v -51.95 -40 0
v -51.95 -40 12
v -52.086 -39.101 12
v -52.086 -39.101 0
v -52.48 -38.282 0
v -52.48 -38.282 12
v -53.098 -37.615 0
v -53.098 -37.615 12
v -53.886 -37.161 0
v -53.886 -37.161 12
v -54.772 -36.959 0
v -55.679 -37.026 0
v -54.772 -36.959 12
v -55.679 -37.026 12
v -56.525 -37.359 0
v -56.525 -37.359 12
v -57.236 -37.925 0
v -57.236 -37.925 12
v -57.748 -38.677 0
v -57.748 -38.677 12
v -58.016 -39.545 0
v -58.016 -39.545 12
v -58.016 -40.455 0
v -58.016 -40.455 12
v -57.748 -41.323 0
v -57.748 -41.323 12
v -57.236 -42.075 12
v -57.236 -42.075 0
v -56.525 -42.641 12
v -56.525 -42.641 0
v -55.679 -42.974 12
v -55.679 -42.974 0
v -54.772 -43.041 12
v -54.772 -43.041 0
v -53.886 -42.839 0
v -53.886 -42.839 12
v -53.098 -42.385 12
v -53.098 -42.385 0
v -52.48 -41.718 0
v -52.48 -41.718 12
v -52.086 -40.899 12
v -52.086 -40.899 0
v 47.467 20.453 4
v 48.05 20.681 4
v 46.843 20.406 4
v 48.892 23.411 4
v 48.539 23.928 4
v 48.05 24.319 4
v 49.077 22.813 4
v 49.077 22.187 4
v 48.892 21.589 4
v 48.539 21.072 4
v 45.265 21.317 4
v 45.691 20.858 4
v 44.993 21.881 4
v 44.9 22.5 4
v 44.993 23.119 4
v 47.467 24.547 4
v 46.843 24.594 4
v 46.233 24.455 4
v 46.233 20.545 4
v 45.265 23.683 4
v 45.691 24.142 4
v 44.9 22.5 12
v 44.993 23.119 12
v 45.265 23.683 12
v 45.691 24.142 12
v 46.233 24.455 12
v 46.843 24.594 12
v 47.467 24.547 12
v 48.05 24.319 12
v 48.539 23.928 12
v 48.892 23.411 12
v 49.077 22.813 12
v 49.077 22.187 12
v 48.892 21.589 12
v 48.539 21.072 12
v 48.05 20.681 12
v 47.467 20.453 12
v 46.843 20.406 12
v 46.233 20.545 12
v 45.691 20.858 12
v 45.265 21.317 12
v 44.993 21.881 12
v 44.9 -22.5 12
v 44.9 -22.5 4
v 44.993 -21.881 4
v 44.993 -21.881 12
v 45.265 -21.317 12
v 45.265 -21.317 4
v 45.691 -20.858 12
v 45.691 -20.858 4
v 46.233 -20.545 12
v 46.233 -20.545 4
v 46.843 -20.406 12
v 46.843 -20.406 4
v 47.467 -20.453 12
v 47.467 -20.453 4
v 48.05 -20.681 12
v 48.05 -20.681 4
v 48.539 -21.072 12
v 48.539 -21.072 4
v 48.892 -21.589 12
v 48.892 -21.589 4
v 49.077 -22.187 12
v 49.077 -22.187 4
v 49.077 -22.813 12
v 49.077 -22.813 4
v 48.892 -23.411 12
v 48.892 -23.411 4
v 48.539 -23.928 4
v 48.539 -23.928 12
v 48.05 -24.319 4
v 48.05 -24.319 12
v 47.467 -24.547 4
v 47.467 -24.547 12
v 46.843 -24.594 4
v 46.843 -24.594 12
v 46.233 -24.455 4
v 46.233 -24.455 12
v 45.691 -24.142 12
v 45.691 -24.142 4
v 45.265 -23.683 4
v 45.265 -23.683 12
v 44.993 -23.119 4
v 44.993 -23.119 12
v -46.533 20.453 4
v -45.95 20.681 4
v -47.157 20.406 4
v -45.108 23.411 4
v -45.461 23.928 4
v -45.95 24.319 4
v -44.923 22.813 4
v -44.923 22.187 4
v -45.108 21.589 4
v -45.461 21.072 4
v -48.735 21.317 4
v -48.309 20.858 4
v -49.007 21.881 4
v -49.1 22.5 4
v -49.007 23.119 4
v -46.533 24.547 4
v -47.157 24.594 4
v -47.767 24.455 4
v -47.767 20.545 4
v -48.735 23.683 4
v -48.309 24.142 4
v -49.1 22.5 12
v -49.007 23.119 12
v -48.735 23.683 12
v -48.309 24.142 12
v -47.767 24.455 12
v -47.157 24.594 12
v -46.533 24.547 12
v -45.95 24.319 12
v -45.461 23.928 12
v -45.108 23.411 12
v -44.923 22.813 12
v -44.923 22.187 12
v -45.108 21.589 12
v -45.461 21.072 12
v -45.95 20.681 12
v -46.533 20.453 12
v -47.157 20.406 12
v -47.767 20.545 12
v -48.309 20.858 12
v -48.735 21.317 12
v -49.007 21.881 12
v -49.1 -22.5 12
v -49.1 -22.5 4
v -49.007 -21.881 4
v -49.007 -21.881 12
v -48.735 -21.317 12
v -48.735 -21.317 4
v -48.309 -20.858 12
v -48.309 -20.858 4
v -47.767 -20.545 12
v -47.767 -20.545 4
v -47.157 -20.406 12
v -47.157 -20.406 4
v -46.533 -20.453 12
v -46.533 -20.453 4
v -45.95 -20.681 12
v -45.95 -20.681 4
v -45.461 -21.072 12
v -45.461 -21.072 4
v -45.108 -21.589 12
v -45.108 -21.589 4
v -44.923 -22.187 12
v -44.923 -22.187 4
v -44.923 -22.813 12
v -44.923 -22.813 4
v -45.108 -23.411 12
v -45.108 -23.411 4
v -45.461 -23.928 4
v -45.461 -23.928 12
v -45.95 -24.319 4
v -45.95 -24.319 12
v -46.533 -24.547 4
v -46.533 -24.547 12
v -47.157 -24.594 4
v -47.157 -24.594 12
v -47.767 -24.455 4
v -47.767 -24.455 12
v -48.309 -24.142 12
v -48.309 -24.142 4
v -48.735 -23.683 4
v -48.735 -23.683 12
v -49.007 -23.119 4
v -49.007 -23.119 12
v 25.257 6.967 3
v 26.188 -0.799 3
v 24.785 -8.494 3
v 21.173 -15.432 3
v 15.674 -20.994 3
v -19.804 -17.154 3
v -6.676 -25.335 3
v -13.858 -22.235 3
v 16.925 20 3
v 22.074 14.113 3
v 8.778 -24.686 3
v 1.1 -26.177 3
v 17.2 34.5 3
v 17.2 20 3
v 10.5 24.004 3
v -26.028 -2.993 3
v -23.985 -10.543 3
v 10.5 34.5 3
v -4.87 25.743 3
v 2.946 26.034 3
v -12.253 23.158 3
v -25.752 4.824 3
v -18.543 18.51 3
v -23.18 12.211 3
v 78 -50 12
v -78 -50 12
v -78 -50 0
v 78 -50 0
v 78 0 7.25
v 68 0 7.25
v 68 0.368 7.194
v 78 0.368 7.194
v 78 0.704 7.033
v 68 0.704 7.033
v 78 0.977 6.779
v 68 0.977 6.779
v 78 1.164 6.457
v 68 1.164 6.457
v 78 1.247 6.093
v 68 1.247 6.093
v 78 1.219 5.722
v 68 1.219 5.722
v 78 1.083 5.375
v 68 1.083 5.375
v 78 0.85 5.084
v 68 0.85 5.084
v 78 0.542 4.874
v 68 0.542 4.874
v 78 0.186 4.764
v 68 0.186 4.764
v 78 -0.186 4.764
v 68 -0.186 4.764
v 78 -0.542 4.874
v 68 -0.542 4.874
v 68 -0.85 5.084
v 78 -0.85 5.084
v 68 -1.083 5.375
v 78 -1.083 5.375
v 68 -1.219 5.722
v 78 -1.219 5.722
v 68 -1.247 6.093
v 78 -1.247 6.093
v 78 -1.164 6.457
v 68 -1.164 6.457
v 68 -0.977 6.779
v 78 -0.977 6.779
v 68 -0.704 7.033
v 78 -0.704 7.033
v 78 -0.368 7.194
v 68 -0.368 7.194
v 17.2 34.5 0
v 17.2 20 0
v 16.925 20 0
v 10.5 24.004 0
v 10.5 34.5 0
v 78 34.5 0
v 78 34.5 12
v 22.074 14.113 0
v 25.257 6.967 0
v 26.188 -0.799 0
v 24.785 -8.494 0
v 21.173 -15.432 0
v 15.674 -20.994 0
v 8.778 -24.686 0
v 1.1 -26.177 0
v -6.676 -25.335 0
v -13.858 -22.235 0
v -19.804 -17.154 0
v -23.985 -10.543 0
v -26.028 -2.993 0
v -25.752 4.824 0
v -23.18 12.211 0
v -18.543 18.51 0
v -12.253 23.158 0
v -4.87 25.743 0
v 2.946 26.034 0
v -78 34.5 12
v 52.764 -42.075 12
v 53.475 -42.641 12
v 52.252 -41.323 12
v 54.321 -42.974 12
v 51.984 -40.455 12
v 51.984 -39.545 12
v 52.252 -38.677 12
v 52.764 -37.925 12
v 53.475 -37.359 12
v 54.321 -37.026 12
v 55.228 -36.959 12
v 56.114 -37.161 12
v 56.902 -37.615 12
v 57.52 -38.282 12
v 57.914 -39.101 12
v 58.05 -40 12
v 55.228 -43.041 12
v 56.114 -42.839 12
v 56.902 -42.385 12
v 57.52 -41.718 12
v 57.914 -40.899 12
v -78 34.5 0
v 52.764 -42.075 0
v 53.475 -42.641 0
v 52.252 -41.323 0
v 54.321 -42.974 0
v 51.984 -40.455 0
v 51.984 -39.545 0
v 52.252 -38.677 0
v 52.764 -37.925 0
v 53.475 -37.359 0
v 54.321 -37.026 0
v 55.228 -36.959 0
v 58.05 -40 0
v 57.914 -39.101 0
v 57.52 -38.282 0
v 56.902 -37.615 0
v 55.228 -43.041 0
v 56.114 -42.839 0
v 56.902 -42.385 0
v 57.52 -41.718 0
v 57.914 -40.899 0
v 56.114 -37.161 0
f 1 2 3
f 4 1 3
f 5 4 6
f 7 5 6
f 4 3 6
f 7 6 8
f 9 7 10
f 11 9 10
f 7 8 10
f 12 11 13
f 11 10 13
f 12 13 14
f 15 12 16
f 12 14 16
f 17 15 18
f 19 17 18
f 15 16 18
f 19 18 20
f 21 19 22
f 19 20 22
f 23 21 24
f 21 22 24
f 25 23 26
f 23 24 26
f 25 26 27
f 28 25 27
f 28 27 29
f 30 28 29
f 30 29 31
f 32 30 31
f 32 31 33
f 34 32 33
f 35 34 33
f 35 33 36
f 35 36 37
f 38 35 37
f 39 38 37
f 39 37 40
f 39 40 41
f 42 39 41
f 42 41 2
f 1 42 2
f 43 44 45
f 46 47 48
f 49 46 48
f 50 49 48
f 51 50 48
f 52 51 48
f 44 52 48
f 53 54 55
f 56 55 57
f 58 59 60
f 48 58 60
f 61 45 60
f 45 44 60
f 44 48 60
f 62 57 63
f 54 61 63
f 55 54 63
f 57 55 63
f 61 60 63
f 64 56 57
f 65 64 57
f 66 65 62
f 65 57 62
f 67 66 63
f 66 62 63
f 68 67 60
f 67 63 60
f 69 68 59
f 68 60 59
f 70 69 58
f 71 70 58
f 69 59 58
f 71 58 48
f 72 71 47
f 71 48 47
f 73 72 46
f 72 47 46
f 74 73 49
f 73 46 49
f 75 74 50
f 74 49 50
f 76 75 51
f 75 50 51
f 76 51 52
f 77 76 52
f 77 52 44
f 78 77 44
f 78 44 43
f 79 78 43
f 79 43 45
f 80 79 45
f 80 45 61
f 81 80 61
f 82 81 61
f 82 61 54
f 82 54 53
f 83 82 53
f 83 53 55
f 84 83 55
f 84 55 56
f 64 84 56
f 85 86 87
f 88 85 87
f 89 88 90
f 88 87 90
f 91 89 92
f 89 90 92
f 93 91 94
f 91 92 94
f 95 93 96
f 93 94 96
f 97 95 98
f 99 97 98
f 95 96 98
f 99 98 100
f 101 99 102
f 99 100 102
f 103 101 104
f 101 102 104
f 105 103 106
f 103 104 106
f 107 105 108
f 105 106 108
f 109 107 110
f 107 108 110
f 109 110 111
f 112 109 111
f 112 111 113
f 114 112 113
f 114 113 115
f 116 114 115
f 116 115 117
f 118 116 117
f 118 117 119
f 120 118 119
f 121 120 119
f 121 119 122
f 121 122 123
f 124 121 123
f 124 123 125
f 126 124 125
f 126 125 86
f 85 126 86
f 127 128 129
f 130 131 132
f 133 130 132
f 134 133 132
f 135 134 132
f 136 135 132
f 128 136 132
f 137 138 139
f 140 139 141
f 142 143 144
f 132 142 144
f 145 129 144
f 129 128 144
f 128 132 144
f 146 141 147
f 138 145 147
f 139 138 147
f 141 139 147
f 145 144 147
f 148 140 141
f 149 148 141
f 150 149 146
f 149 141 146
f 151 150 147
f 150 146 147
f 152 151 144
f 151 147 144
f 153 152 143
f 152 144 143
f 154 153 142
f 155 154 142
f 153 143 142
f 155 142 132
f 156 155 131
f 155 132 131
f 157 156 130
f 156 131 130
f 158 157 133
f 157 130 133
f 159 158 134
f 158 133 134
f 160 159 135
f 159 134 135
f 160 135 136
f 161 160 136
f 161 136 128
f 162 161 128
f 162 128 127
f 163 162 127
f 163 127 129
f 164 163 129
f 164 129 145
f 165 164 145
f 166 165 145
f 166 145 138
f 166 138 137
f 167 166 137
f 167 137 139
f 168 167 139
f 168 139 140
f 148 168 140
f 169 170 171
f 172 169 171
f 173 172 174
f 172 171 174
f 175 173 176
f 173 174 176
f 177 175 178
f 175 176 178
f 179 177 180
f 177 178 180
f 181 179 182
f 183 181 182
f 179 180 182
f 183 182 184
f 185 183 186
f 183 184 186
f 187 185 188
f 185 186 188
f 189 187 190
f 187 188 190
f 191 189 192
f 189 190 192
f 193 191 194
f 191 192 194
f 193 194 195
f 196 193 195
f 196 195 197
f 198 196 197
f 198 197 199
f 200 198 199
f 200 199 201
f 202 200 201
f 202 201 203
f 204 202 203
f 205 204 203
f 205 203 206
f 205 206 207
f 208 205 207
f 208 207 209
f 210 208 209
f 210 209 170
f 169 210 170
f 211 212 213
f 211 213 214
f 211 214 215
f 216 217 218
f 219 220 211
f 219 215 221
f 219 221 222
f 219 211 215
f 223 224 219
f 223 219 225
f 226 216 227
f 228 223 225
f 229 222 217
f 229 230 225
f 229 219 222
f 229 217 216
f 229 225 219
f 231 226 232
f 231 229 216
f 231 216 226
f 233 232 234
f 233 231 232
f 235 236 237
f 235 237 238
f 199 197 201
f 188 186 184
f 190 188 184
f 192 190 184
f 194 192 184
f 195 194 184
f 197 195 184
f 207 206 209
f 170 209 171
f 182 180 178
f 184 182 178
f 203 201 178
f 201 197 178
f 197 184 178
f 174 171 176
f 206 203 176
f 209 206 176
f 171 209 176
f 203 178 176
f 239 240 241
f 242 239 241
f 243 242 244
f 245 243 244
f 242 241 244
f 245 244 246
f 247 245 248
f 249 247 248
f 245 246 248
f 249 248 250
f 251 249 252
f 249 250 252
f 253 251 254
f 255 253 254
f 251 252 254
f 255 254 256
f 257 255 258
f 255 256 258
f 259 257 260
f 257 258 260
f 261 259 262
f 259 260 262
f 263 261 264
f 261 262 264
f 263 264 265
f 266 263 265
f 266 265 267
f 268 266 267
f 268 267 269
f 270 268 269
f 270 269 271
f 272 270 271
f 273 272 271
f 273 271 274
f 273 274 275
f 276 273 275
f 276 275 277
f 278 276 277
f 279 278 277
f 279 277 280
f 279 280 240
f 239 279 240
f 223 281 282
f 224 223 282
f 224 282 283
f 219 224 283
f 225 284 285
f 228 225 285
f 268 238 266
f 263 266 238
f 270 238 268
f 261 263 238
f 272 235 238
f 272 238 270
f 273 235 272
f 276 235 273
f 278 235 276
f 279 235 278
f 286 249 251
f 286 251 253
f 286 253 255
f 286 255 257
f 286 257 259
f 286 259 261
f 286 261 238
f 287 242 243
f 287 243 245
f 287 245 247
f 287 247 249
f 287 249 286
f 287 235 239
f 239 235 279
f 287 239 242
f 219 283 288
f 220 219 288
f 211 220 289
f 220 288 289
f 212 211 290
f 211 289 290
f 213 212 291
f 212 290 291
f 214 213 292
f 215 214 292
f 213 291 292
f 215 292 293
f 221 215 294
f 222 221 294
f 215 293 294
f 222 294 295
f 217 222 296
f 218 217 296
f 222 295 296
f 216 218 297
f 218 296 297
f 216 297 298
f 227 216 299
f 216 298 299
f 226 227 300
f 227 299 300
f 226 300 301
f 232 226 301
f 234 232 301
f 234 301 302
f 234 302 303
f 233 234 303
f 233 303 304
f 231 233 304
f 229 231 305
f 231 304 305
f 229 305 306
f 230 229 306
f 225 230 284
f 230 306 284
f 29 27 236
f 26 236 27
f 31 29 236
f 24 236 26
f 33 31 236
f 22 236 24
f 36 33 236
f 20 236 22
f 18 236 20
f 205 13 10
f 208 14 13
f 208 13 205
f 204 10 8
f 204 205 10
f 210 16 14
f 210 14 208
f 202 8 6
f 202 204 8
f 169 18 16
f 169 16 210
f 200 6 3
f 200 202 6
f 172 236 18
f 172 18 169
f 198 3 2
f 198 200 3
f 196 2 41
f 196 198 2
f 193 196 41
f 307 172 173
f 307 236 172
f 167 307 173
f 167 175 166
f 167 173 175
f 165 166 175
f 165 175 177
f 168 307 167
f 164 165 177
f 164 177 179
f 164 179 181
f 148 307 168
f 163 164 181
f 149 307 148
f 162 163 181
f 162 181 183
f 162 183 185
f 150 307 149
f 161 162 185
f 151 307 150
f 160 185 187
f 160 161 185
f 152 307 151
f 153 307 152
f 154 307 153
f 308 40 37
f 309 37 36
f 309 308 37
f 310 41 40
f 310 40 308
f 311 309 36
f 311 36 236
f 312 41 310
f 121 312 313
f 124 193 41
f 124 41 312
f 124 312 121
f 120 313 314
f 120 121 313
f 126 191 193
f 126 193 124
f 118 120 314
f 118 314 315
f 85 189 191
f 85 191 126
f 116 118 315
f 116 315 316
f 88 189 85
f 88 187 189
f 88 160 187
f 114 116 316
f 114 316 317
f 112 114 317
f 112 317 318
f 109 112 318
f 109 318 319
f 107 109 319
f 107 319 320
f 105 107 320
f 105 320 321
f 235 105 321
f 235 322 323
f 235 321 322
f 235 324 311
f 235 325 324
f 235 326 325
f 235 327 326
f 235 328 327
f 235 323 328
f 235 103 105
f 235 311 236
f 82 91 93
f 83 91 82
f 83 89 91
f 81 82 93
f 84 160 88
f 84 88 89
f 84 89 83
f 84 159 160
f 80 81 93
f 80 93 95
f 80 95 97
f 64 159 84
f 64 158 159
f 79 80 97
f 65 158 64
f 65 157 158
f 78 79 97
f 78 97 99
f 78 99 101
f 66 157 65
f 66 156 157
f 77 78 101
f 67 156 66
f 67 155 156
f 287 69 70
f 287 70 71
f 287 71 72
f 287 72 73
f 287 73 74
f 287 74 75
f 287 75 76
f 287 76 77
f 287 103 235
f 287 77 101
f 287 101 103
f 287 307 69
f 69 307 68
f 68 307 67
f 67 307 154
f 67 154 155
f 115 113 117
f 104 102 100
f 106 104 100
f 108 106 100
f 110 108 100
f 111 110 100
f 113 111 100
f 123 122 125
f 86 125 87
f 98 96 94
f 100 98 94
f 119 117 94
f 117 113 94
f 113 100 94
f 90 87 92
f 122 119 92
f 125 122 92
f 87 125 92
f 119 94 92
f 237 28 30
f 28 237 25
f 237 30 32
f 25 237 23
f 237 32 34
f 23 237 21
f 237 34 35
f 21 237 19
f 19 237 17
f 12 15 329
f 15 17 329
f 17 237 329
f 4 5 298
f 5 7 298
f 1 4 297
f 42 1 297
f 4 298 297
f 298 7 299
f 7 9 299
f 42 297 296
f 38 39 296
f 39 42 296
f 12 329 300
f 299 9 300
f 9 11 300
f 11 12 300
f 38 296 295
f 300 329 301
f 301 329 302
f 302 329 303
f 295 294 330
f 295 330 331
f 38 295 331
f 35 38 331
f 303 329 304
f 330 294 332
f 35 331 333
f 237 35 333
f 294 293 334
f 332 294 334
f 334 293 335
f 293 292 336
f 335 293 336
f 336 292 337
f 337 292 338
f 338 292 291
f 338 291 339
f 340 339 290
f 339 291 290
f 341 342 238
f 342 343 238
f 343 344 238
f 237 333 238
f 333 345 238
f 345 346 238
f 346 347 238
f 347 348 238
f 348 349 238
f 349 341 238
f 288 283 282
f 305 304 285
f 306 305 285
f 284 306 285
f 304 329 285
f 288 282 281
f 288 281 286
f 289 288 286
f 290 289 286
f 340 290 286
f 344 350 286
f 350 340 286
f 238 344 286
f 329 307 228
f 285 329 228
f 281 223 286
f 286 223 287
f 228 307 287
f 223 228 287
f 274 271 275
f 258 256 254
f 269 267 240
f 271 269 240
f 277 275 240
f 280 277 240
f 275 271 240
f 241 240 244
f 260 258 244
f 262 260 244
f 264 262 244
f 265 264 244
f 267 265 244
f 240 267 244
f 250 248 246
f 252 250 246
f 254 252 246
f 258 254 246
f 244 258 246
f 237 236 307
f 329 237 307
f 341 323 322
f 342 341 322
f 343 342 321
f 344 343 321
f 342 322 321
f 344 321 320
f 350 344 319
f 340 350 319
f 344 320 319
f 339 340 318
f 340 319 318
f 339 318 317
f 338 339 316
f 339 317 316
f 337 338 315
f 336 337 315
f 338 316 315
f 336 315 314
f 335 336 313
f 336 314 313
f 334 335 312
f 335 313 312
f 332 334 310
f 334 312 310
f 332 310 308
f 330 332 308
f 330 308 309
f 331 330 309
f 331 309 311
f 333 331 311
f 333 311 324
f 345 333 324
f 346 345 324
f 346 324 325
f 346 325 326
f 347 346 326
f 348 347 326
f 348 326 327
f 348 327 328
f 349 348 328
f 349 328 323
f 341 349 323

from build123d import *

# Parameters (mm, degrees)
SKETCH1_W                      = 156
SKETCH1_H                      = 84.5
BOSS_EXTRUDE1_DEPTH            = 12
CUT_EXTRUDE1_DEPTH             = 3
F_2_5_2_5_DIAMETER_HOLE1_D     = 2.5
F_2_5_2_5_DIAMETER_HOLE1_DEPTH = 10
F_6_1_6_1_DIAMETER_HOLE1_D     = 6.1
F_4_2_4_2_DIAMETER_HOLE1_D     = 4.2
F_4_2_4_2_DIAMETER_HOLE1_DEPTH = 8


with BuildPart() as part:
    # Sketch1 → Boss-Extrude1 (new body)
    with BuildSketch(Plane.XY.offset(12)):
        with Locations((0, -7.75)):
            Rectangle(SKETCH1_W, SKETCH1_H)
    extrude(amount=-BOSS_EXTRUDE1_DEPTH)

    # Sketch2 → Cut-Extrude1 (cut)
    with BuildSketch(Plane(origin=(0, 0, 0), x_dir=(-1, 0, 0), z_dir=(0, 0, -1))):
        with BuildLine():
            Line((-10.5, 24.003958007), (-10.5, 34.5))
            Line((-10.5, 34.5), (-17.2, 34.5))
            Line((-17.2, 34.5), (-17.2, 20))
            Line((-17.2, 20), (-16.924538398, 20))
            ThreePointArc((-16.924538398, 20), (13.85764217, -22.235236753), (-10.5, 24.003958007))
        make_face()
    extrude(amount=-CUT_EXTRUDE1_DEPTH, mode=Mode.SUBTRACT)

    # Ø2.5 (2.5) Diameter Hole1
    with Locations(Plane(origin=(78, 0, 0), x_dir=(0, 0, -1), z_dir=(1, 0, 0))):
        with Locations((-6, 0)):
            Hole(F_2_5_2_5_DIAMETER_HOLE1_D / 2, depth=F_2_5_2_5_DIAMETER_HOLE1_DEPTH)

    # Ø6.1 (6.1) Diameter Hole1 (through all)
    with Locations(Plane(origin=(0, 0, 0), x_dir=(-1, 0, 0), z_dir=(0, 0, -1))):
        with Locations((-55, -40), (55, -40)):
            Hole(F_6_1_6_1_DIAMETER_HOLE1_D / 2)

    # Ø4.2 (4.2) Diameter Hole1
    with Locations(Plane.XY.offset(12)):
        with Locations((47, 22.5), (-47, 22.5), (47, -22.5), (-47, -22.5)):
            Hole(F_4_2_4_2_DIAMETER_HOLE1_D / 2, depth=F_4_2_4_2_DIAMETER_HOLE1_DEPTH)


solid = part.part
